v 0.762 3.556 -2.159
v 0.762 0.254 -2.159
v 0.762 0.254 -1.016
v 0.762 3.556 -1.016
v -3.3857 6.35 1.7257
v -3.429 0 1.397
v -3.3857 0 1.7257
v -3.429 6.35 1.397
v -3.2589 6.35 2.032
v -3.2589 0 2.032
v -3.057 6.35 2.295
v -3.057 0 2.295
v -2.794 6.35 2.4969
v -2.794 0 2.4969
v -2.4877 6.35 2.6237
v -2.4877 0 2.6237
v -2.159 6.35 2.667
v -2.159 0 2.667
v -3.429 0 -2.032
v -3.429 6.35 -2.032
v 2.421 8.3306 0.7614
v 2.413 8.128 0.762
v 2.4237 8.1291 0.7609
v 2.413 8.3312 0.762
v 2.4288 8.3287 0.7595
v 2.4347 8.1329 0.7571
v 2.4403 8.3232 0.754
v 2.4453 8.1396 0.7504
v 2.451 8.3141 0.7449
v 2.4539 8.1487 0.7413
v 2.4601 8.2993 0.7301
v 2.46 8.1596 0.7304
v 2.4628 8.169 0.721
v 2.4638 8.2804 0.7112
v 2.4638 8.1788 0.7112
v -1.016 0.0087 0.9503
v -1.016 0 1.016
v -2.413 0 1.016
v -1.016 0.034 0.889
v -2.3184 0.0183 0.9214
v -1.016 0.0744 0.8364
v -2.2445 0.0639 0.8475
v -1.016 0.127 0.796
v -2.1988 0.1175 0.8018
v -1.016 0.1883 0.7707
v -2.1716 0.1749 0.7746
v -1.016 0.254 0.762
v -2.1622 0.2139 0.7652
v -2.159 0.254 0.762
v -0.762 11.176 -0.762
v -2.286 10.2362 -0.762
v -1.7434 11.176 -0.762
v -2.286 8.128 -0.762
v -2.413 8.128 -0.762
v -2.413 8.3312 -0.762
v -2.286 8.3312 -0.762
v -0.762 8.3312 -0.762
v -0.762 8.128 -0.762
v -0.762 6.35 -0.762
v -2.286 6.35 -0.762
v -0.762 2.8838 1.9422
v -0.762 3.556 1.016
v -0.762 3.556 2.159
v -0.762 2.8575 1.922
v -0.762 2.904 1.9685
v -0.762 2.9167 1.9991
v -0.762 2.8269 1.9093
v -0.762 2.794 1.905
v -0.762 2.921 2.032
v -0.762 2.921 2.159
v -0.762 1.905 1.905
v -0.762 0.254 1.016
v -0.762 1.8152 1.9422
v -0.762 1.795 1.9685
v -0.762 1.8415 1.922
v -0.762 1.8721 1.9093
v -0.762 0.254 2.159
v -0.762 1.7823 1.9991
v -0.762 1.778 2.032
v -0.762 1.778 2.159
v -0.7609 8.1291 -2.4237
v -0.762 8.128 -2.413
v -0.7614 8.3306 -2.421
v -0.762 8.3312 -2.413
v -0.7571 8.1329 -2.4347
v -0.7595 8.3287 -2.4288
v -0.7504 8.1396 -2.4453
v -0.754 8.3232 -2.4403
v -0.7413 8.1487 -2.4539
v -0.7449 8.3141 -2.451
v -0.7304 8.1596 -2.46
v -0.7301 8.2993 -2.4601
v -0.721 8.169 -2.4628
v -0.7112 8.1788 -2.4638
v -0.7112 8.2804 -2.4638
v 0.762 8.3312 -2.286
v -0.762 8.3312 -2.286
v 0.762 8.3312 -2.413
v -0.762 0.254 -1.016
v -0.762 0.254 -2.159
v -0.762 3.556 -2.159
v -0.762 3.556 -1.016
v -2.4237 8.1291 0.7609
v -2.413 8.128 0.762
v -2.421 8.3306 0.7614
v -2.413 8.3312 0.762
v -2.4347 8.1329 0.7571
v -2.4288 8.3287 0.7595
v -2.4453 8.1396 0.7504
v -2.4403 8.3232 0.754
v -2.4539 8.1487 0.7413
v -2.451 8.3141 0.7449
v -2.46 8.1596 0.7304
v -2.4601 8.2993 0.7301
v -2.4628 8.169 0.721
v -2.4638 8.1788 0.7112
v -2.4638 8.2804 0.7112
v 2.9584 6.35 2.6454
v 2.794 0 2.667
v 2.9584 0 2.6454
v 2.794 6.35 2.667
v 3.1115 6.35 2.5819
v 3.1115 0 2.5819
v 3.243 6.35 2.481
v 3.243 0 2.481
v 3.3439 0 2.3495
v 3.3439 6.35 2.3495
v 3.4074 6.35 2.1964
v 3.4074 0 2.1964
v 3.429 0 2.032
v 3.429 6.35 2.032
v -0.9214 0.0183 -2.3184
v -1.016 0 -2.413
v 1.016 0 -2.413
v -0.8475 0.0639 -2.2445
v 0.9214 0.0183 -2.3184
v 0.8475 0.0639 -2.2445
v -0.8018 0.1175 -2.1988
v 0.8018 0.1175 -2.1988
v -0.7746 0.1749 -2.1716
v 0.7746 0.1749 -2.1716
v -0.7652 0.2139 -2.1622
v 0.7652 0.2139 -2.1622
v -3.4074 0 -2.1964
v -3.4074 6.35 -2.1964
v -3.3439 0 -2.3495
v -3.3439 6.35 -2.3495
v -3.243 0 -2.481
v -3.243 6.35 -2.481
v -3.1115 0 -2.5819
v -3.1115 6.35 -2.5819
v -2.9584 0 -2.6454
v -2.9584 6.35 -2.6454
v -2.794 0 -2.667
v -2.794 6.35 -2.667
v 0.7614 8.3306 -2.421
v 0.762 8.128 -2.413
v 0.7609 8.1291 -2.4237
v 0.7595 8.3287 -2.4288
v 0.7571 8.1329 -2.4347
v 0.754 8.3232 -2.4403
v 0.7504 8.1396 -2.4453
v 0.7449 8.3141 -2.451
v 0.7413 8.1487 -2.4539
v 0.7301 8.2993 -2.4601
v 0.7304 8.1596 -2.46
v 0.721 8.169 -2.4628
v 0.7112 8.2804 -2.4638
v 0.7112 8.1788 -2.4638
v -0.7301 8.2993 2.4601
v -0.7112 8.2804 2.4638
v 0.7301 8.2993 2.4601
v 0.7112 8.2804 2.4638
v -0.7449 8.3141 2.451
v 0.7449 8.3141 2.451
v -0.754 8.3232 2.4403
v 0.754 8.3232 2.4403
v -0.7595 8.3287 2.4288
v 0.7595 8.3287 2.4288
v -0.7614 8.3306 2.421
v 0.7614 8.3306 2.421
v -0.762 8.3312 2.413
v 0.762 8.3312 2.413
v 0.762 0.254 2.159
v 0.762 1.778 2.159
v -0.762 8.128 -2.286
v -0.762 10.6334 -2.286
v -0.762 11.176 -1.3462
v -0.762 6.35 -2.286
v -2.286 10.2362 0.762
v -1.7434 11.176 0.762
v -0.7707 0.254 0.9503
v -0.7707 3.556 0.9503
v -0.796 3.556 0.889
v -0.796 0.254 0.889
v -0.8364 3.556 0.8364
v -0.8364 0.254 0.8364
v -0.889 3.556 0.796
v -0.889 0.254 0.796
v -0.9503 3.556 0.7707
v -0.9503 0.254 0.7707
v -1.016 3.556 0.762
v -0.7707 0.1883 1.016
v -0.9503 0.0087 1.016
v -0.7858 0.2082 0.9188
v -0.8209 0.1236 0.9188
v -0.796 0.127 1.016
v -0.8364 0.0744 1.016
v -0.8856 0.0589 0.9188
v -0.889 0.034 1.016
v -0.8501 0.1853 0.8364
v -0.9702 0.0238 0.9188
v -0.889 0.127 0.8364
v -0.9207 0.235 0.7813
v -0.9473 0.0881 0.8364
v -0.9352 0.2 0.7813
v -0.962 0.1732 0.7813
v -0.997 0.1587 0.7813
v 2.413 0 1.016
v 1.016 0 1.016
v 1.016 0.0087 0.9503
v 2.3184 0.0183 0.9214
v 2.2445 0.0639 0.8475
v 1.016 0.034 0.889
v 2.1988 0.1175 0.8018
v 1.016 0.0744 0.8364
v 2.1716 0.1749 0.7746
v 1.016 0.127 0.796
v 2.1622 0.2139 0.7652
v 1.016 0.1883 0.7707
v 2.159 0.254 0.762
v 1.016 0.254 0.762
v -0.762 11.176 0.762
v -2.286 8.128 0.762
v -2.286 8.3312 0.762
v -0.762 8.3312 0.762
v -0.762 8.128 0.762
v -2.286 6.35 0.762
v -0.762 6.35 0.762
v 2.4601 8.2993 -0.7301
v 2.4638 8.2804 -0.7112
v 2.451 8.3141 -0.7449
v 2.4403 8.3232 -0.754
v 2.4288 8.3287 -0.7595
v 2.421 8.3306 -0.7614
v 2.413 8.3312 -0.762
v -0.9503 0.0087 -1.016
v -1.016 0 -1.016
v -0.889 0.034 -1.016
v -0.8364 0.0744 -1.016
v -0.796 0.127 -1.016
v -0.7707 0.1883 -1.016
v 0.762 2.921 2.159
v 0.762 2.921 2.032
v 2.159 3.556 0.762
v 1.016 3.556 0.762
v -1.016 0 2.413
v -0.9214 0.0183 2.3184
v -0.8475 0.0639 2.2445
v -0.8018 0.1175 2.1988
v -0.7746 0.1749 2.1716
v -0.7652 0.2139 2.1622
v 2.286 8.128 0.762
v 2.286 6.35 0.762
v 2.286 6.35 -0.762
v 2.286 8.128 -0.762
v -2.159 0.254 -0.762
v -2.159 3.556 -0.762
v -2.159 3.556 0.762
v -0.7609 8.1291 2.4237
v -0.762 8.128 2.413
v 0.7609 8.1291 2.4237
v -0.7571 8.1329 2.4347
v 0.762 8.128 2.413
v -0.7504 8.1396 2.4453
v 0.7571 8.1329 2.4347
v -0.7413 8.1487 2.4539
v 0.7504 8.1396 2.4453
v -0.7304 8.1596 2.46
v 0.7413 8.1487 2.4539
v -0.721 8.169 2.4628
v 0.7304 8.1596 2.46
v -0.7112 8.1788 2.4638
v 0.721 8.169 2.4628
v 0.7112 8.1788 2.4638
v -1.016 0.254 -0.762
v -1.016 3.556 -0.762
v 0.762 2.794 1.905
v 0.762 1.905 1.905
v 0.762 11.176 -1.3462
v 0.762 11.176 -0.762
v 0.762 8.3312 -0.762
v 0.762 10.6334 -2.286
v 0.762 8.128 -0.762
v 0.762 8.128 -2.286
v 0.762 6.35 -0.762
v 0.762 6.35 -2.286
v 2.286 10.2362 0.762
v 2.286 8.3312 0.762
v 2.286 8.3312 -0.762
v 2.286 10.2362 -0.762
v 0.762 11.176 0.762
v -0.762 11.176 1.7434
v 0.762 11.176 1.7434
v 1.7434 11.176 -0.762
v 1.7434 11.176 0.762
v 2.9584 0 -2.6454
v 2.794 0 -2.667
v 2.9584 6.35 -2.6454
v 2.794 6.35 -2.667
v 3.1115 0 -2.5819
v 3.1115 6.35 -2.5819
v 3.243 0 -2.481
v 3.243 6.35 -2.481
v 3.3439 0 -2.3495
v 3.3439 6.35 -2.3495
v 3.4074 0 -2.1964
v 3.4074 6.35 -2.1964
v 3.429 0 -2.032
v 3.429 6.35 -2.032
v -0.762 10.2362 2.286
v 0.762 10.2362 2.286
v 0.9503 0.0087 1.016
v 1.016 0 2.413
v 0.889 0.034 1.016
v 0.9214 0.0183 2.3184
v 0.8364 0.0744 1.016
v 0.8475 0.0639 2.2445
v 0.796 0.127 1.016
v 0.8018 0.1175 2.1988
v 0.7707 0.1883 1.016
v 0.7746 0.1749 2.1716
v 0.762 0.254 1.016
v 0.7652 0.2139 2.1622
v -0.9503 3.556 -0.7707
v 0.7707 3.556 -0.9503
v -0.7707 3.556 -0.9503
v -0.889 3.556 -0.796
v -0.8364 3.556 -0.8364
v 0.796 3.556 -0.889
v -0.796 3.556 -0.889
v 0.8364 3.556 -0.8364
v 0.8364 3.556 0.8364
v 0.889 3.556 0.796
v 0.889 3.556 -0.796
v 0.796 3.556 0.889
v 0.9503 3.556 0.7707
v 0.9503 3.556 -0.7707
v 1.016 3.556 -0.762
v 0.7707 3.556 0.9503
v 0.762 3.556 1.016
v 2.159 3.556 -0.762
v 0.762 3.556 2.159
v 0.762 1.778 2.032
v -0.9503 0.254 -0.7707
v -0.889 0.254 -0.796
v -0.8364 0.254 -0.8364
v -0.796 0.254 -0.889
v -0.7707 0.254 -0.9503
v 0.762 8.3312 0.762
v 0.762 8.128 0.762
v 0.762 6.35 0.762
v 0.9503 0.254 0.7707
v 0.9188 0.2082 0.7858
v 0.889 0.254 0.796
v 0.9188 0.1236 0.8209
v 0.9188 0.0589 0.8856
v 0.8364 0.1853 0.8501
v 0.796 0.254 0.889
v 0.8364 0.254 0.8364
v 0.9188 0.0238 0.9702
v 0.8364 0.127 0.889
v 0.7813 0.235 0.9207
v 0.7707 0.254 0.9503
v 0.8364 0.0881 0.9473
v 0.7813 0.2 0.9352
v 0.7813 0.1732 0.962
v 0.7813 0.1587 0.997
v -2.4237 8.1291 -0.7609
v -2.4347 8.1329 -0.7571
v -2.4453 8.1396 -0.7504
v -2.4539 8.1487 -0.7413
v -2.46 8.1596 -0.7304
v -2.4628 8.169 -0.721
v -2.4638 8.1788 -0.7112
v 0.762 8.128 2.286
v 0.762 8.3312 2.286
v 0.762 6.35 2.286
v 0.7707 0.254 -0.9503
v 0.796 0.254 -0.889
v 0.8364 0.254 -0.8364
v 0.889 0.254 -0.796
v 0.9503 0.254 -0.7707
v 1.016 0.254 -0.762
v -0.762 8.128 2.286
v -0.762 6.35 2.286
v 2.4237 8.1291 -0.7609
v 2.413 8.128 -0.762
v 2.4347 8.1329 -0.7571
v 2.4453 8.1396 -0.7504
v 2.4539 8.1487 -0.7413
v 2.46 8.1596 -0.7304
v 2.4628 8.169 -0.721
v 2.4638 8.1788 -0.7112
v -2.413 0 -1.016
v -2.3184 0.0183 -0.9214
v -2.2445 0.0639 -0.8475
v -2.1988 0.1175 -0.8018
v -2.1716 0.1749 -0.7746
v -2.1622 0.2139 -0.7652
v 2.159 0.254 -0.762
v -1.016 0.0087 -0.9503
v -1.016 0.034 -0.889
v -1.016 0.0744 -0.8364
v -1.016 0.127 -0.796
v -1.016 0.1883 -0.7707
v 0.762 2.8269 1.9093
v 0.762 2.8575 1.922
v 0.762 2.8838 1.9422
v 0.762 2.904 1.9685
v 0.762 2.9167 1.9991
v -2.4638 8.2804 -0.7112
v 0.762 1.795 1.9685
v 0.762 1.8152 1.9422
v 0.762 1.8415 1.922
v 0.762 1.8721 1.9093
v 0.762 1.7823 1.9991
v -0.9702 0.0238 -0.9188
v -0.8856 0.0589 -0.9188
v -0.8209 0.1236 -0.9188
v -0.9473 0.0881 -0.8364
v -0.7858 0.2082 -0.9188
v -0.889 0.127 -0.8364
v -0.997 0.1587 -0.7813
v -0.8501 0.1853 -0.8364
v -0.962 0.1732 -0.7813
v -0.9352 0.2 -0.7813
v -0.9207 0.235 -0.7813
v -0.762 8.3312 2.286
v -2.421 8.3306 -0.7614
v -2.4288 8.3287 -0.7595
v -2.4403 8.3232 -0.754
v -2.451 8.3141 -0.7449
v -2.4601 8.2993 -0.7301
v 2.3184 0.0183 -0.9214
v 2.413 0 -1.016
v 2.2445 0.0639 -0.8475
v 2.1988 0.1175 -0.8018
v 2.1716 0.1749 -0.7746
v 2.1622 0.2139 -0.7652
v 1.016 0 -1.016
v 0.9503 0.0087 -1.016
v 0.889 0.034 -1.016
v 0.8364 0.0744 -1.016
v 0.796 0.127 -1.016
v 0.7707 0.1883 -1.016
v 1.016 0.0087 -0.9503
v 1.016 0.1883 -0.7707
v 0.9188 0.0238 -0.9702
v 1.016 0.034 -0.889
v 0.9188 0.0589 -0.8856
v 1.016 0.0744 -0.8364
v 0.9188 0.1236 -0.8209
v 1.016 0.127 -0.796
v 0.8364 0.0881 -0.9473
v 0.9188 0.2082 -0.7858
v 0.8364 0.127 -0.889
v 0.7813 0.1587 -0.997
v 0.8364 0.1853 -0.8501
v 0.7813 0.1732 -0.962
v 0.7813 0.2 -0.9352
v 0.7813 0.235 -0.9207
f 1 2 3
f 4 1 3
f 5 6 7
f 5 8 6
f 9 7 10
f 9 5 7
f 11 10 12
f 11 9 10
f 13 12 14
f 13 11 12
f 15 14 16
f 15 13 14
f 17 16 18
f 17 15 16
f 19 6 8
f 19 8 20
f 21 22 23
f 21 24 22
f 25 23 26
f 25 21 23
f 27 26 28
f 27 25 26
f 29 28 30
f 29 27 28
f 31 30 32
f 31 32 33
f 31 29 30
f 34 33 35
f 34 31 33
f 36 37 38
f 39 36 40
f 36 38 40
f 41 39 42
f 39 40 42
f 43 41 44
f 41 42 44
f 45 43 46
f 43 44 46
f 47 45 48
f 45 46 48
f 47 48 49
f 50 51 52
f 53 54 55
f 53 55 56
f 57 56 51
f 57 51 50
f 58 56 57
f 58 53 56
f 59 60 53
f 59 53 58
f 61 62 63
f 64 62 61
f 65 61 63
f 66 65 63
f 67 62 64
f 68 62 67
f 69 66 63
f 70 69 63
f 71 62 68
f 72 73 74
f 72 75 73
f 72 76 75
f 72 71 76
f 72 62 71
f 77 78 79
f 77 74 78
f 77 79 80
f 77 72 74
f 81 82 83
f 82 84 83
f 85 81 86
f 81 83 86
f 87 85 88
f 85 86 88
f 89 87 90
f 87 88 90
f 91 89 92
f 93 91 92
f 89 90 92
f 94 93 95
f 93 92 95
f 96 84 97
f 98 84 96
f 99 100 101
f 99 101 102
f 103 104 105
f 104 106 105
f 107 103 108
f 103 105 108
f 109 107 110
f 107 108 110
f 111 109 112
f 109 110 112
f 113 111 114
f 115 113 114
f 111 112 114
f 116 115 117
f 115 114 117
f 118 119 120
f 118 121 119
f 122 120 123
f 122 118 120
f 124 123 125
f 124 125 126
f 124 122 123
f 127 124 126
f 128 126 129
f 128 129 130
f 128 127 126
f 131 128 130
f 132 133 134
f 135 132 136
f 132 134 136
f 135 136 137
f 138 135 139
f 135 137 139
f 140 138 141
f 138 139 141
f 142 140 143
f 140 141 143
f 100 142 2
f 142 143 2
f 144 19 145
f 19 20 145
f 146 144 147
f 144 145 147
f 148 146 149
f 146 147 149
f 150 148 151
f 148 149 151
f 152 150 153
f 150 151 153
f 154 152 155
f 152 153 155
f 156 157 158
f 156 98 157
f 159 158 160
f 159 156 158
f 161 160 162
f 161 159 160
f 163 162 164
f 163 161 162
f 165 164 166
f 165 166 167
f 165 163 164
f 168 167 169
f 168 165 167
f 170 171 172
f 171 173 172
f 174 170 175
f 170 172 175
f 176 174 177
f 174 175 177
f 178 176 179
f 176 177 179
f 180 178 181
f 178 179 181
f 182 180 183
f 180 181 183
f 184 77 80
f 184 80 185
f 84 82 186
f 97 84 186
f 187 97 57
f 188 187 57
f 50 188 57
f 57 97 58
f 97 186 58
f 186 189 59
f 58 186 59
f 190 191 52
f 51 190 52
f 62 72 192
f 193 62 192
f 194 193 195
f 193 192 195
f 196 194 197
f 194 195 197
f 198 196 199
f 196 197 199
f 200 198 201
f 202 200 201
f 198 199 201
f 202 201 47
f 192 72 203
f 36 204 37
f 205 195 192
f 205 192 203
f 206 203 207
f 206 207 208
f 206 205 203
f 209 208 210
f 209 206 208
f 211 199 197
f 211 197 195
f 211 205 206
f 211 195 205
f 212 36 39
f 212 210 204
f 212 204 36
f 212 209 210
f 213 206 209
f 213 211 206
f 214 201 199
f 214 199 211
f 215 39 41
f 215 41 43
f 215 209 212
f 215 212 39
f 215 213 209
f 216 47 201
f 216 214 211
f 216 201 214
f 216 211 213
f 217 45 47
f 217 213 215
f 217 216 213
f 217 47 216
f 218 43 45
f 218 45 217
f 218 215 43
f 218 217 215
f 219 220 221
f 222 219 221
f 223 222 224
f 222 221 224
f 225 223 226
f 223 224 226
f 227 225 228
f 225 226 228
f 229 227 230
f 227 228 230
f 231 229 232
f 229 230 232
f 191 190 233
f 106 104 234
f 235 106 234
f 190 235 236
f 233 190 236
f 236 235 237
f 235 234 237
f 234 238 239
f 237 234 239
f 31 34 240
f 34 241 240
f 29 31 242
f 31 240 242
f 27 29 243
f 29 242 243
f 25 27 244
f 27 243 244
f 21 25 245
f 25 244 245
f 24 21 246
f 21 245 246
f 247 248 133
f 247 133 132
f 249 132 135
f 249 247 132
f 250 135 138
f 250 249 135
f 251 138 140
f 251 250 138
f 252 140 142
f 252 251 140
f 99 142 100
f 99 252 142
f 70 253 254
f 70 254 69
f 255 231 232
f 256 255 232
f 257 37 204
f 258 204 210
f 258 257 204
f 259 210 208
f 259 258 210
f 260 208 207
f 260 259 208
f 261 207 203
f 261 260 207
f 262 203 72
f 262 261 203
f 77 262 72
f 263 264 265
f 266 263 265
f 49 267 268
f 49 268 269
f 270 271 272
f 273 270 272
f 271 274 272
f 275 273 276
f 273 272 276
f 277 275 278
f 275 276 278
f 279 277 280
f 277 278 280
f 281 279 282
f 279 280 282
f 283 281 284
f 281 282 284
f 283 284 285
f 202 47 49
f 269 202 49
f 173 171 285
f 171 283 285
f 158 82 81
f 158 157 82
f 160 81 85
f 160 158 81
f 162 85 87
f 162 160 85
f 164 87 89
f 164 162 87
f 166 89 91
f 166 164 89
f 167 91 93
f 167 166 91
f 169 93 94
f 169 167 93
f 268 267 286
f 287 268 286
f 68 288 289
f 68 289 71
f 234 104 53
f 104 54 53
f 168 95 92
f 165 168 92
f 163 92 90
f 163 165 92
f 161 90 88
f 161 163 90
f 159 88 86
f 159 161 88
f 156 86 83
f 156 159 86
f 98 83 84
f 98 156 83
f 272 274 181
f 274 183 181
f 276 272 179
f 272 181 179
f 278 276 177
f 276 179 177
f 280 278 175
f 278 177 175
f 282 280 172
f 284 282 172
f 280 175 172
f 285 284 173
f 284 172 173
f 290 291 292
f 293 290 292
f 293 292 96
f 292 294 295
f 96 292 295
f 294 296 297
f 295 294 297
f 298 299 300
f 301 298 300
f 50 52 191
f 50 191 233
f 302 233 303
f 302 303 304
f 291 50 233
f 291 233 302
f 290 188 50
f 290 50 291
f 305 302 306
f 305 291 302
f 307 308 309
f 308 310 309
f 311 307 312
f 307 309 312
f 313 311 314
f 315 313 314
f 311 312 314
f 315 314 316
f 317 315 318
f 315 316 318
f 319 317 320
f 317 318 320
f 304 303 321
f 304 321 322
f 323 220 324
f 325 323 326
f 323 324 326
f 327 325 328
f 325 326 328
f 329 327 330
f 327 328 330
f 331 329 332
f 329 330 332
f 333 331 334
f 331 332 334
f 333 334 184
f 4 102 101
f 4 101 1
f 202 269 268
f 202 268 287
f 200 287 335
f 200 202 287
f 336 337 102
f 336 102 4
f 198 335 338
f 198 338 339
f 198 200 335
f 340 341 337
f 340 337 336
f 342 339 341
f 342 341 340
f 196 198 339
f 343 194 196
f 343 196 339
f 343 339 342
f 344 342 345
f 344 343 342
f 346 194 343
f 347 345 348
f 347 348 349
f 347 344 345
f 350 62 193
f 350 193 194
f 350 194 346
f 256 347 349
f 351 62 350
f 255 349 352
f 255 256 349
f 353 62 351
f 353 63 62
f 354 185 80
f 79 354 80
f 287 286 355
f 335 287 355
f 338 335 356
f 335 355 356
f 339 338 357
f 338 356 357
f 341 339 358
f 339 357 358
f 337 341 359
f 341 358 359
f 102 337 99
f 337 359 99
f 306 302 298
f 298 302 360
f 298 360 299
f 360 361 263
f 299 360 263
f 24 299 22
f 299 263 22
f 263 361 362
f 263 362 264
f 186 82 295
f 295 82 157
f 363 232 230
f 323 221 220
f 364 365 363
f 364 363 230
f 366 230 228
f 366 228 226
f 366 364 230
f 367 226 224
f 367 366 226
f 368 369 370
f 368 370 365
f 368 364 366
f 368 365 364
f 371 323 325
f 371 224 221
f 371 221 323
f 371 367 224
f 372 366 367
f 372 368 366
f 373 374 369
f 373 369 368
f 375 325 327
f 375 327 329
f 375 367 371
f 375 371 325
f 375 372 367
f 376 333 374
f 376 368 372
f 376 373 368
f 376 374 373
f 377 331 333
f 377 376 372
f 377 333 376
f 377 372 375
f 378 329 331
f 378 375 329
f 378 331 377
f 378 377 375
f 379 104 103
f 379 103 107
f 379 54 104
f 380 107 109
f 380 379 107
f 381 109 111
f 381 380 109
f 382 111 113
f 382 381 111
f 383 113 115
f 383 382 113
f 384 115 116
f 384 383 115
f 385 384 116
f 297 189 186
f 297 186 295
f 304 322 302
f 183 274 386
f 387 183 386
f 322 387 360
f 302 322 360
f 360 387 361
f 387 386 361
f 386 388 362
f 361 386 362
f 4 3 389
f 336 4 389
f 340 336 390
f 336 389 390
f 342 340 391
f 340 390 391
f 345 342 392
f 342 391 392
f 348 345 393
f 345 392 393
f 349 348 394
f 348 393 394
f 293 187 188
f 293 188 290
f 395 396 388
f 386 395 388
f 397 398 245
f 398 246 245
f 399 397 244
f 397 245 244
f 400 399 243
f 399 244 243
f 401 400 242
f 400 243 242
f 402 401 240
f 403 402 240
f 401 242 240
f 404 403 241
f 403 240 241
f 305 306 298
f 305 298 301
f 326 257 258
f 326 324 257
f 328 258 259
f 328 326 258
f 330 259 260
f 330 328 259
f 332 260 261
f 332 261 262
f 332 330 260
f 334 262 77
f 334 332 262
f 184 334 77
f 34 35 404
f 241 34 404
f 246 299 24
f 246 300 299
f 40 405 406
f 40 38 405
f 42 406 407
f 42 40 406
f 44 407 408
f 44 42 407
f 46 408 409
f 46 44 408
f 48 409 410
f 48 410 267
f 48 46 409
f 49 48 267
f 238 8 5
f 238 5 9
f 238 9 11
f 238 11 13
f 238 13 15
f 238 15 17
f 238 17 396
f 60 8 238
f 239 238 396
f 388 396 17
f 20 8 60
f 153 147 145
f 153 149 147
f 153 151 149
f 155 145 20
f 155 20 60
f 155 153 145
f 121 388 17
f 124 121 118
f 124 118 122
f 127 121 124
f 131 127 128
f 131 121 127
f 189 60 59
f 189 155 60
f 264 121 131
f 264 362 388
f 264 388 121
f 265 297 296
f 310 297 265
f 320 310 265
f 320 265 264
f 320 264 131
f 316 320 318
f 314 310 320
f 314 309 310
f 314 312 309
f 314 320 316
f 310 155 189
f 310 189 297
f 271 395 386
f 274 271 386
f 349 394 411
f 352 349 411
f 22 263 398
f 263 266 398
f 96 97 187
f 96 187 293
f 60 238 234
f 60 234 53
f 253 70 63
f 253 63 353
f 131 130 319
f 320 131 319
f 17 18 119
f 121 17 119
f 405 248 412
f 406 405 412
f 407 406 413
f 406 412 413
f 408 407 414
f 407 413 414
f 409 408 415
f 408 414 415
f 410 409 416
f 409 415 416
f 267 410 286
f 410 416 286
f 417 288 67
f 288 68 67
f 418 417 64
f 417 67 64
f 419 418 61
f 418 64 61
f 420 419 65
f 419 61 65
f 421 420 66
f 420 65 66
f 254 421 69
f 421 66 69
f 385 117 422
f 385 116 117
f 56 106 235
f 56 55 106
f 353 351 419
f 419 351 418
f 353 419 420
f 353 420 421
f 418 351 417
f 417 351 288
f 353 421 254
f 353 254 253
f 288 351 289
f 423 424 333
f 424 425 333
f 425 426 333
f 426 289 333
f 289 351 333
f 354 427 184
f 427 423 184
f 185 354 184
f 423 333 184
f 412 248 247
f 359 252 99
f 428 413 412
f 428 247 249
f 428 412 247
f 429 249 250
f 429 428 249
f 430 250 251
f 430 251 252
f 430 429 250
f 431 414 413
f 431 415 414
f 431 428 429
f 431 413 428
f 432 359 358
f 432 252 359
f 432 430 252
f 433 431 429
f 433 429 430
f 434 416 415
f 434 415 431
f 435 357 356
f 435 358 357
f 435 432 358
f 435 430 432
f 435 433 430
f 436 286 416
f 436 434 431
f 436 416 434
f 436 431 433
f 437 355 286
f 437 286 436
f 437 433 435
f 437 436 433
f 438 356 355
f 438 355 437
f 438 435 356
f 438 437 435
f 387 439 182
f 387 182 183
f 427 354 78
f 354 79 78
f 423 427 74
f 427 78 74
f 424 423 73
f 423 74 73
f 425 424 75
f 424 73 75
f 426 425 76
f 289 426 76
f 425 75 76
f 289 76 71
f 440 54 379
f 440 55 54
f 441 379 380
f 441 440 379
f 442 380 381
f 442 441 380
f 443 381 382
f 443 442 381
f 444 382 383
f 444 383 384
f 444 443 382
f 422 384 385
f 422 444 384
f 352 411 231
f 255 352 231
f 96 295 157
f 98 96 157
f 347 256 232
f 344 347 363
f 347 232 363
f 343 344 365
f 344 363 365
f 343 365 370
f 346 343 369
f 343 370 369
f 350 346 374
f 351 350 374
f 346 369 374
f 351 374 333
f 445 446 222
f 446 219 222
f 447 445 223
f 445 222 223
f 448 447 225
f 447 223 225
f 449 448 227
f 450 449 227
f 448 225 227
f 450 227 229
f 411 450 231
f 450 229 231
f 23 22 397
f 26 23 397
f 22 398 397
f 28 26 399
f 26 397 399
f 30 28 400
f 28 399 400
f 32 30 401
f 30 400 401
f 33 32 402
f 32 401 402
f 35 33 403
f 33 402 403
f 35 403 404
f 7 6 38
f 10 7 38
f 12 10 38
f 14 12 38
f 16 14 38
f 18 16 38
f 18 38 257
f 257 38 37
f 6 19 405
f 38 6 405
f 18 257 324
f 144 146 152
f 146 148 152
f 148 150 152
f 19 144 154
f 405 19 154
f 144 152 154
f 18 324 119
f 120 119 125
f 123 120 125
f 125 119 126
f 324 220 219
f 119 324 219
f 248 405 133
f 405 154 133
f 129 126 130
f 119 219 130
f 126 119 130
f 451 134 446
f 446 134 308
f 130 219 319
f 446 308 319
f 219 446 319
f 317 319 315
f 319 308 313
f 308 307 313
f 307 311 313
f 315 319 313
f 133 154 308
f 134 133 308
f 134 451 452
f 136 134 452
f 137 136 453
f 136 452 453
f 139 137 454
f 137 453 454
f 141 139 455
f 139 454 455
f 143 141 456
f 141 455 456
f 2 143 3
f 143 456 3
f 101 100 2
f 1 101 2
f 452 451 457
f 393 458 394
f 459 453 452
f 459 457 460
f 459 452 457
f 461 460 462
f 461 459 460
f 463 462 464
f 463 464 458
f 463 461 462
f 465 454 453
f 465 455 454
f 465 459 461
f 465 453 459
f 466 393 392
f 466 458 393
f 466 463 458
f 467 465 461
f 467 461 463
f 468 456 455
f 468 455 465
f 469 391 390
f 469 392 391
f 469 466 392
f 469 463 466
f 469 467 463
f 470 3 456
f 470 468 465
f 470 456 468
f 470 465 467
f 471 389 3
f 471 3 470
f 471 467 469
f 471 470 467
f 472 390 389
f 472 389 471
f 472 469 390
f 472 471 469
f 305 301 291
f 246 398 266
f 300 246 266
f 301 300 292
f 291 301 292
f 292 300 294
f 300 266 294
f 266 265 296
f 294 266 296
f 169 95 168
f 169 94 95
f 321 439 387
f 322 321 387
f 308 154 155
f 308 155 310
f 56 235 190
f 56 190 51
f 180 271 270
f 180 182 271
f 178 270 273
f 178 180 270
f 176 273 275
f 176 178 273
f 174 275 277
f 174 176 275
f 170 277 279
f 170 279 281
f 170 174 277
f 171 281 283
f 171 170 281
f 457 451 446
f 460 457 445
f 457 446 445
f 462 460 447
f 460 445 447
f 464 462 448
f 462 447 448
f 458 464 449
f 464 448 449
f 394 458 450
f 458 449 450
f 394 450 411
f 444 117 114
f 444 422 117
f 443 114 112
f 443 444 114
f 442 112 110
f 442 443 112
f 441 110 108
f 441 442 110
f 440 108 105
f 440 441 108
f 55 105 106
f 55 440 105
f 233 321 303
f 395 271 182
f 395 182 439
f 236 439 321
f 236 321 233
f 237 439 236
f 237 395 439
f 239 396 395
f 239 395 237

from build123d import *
from OCP.BRepFilletAPI import BRepFilletAPI_MakeChamfer

# Parameters (mm, degrees)
SKETCH1_W           = 6.858
SKETCH1_H           = 5.334
BOSS_EXTRUDE1_DEPTH = 6.35
SKETCH2_W           = 1.524
SKETCH2_H           = 1.524
BOSS_EXTRUDE2_DEPTH = 4.826
CHAMFER1_SIZE       = 0.9398
CHAMFER1_SIZE2      = 0.542593783
BOSS_EXTRUDE3_START = -3.048
SKETCH3_W           = 0.720393783
SKETCH3_H           = 1.524
SKETCH3_W_2         = 0.981406217
SKETCH3_W_3         = 1.524
SKETCH3_H_2         = 1.1176
SKETCH3_H_3         = 0.5842
SKETCH3_H_4         = 0.981406217
SKETCH3_H_5         = 0.720393783
BOSS_EXTRUDE3_DEPTH = 0.2032
SKETCH4_W           = 1.397
SKETCH4_H           = 1.524
SKETCH4_W_2         = 1.524
SKETCH4_H_2         = 1.397
CUT_EXTRUDE1_DEPTH  = 3.556
SKETCH5_W           = 1.524
SKETCH5_H           = 1.143
BOSS_EXTRUDE4_DEPTH = 0.254
FILLET1_R           = 0.127
FILLET2_R           = 0.0508
FILLET3_R           = 0.635
FILLET4_R           = 0.254
FILLET5_R           = 0.254
FILLET6_R           = 1.27


with BuildPart() as part:
    # Sketch1 → Boss-Extrude1 (new body)
    with BuildSketch(Plane(origin=(0, 0, 0), x_dir=(1, 0, 0), z_dir=(0, 1, 0))):
        Rectangle(SKETCH1_W, SKETCH1_H)
    extrude(amount=BOSS_EXTRUDE1_DEPTH)

    # Sketch2 → Boss-Extrude2 (add)
    with BuildSketch(Plane(origin=(0, 6.35, 0), x_dir=(1, 0, 0), z_dir=(0, 1, 0))):
        Rectangle(SKETCH2_W, SKETCH2_H)
        with Locations((1.524, 0)):
            Rectangle(SKETCH2_W, SKETCH2_H)
        with Locations((0, 1.524)):
            Rectangle(SKETCH2_W, SKETCH2_H)
        with Locations((-1.524, 0)):
            Rectangle(SKETCH2_W, SKETCH2_H)
        with Locations((0, -1.524)):
            Rectangle(SKETCH2_W, SKETCH2_H)
    extrude(amount=BOSS_EXTRUDE2_DEPTH)

    # Chamfer1: one chamfer whose edges measure the first distance from different faces: ONE call of the kernel's chamfer builder (chamfer() names one face for all edges)
    chamfer1_edges_1 = [part.edges().sort_by_distance(p)[0] for p in [
        (2.286, 11.176, 0),
    ]]
    chamfer1_side_1 = [part.faces().sort_by_distance(p)[0] for p in [
        (2.286, 8.763, 0),
    ]]
    chamfer1_edges_2 = [part.edges().sort_by_distance(p)[0] for p in [
        (0, 11.176, -2.286),
    ]]
    chamfer1_side_2 = [part.faces().sort_by_distance(p)[0] for p in [
        (0, 11.176, 0),
    ]]
    chamfer1_edges_3 = [part.edges().sort_by_distance(p)[0] for p in [
        (-2.286, 11.176, 0),
    ]]
    chamfer1_side_3 = [part.faces().sort_by_distance(p)[0] for p in [
        (-2.286, 8.763, 0),
    ]]
    chamfer1_edges_4 = [part.edges().sort_by_distance(p)[0] for p in [
        (0, 11.176, 2.286),
    ]]
    chamfer1_side_4 = [part.faces().sort_by_distance(p)[0] for p in [
        (0, 8.763, 2.286),
    ]]
    chamfer1 = BRepFilletAPI_MakeChamfer(part.part.solid().wrapped)
    for e in chamfer1_edges_1:
        chamfer1.Add(CHAMFER1_SIZE, CHAMFER1_SIZE2, e.wrapped, chamfer1_side_1[0].wrapped)  # the first distance lies on this face
    for e in chamfer1_edges_2:
        chamfer1.Add(CHAMFER1_SIZE, CHAMFER1_SIZE2, e.wrapped, chamfer1_side_2[0].wrapped)  # the first distance lies on this face
    for e in chamfer1_edges_3:
        chamfer1.Add(CHAMFER1_SIZE, CHAMFER1_SIZE2, e.wrapped, chamfer1_side_3[0].wrapped)  # the first distance lies on this face
    for e in chamfer1_edges_4:
        chamfer1.Add(CHAMFER1_SIZE, CHAMFER1_SIZE2, e.wrapped, chamfer1_side_4[0].wrapped)  # the first distance lies on this face
    add(Compound.cast(chamfer1.Shape()), mode=Mode.REPLACE)

    # Sketch3 → Boss-Extrude3 (add)
    with BuildSketch(Plane(origin=(0, 11.176, 0), x_dir=(1, 0, 0), z_dir=(0, 1, 0)).offset(BOSS_EXTRUDE3_START)):
        with Locations((2.103603109, 0)):
            Rectangle(SKETCH3_W, SKETCH3_H)
        with Locations((1.252703108, 0)):
            Rectangle(SKETCH3_W_2, SKETCH3_H)
        with Locations((0, 1.905)):
            Rectangle(SKETCH3_W_3, SKETCH3_H_2)
        with Locations((0, 1.0541)):
            Rectangle(SKETCH3_W_3, SKETCH3_H_3)
        Rectangle(SKETCH3_W_3, SKETCH3_H)
        with Locations((-1.252703108, 0)):
            Rectangle(SKETCH3_W_2, SKETCH3_H)
        with Locations((-2.103603109, 0)):
            Rectangle(SKETCH3_W, SKETCH3_H)
        with Locations((0, -1.252703108)):
            Rectangle(SKETCH3_W_3, SKETCH3_H_4)
        with Locations((0, -2.103603109)):
            Rectangle(SKETCH3_W_3, SKETCH3_H_5)
    extrude(amount=BOSS_EXTRUDE3_DEPTH)

    # Sketch4 → Cut-Extrude1 (cut)
    with BuildSketch(Plane.XZ):
        with Locations((-1.4605, 0)):
            Rectangle(SKETCH4_W, SKETCH4_H)
        Rectangle(SKETCH4_W_2, SKETCH4_H)
        with Locations((1.4605, 0)):
            Rectangle(SKETCH4_W, SKETCH4_H)
        with Locations((0, -1.4605)):
            Rectangle(SKETCH4_W_2, SKETCH4_H_2)
        with Locations((0, 1.4605)):
            Rectangle(SKETCH4_W_2, SKETCH4_H_2)
    extrude(amount=-CUT_EXTRUDE1_DEPTH, mode=Mode.SUBTRACT)

    # Sketch5 → Boss-Extrude4 (add)
    with BuildSketch(Plane(origin=(0, 0, 2.159), x_dir=(-1, 0, 0), z_dir=(0, 0, -1))):
        with Locations((0, 2.3495)):
            Rectangle(SKETCH5_W, SKETCH5_H)
    extrude(amount=BOSS_EXTRUDE4_DEPTH)

    # Fillet1
    fillet1_edges = [part.edges().sort_by_distance(p)[0] for p in [
        (0, 1.778, 1.905),
        (0, 2.921, 1.905),
    ]]
    fillet(fillet1_edges, radius=FILLET1_R)

    # Fillet2
    fillet2_edges = [part.edges().sort_by_distance(p)[0] for p in [
        (-2.4638, 8.3312, 0),
        (0, 8.3312, 2.4638),
        (2.4638, 8.128, 0),
        (2.4638, 8.3312, 0),
        (2.4638, 8.2296, 0.762),
        (2.4638, 8.2296, -0.762),
        (0, 8.3312, -2.4638),
        (0.762, 8.2296, -2.4638),
        (-0.762, 8.2296, -2.4638),
        (-2.4638, 8.128, 0),
        (-2.4638, 8.2296, -0.762),
        (0, 8.128, 2.4638),
        (-0.762, 8.2296, 2.4638),
        (0, 8.128, -2.4638),
        (-2.4638, 8.2296, 0.762),
        (0.762, 8.2296, 2.4638),
    ]]
    fillet(fillet2_edges, radius=FILLET2_R)

    # Fillet3
    fillet3_edges = [part.edges().sort_by_distance(p)[0] for p in [
        (3.429, 3.175, 2.667),
        (-3.429, 3.175, -2.667),
        (3.429, 3.175, -2.667),
    ]]
    fillet(fillet3_edges, radius=FILLET3_R)

    # Fillet4
    fillet4_edges = [part.edges().sort_by_distance(p)[0] for p in [
        (-1.4605, 0, -0.762),
        (-2.159, 0, 0),
        (0.762, 0, 1.4605),
        (1.4605, 0, -0.762),
        (0.762, 0, -1.4605),
        (0, 0, -2.159),
        (-0.762, 0, -1.4605),
        (2.159, 0, 0),
        (1.4605, 0, 0.762),
        (0, 0, 2.159),
        (-0.762, 0, 1.4605),
        (-1.4605, 0, 0.762),
    ]]
    fillet(fillet4_edges, radius=FILLET4_R)

    # Fillet5
    # the kernel refuses this fillet: 0.254 mm, written as the material it takes off along each edge
    with BuildSketch(Plane(origin=(1.016, 0.254, -1.016), x_dir=(0, 0, 1), z_dir=(-1, 0, 0))) as fillet5_piece_1_section:
        Polygon((0, 0), (FILLET5_R, 0), (FILLET5_R, -FILLET5_R), (0, -FILLET5_R), align=None)
    fillet5_piece_1 = extrude(amount=FILLET5_R, mode=Mode.PRIVATE)
    fillet5_piece_1 = fillet5_piece_1 - Plane(origin=(1.016, 0.254, -1.016), x_dir=(0, 0.7071067811865475, -0.7071067811865475), z_dir=(-1, 0, 0)) * Sphere(FILLET5_R, mode=Mode.PRIVATE)
    add(fillet5_piece_1, mode=Mode.SUBTRACT)
    with BuildSketch(Plane(origin=(1.016, 0.254, 1.016), x_dir=(0, 0, -1), z_dir=(-1, 0, 0))) as fillet5_piece_2_section:
        Polygon((0, 0), (FILLET5_R, 0), (FILLET5_R, FILLET5_R), (0, FILLET5_R), align=None)
    fillet5_piece_2 = extrude(amount=FILLET5_R, mode=Mode.PRIVATE)
    fillet5_piece_2 = fillet5_piece_2 - Plane(origin=(1.016, 0.254, 1.016), x_dir=(0, 0.7071067811865475, 0.7071067811865475), z_dir=(-1, 0, 0)) * Sphere(FILLET5_R, mode=Mode.PRIVATE)
    add(fillet5_piece_2, mode=Mode.SUBTRACT)
    with BuildSketch(Plane(origin=(-1.016, 0.254, -1.016), x_dir=(1, 0, 0), z_dir=(0, 0, 1))) as fillet5_piece_3_section:
        Polygon((0, 0), (FILLET5_R, 0), (FILLET5_R, -FILLET5_R), (0, -FILLET5_R), align=None)
    fillet5_piece_3 = extrude(amount=FILLET5_R, mode=Mode.PRIVATE)
    fillet5_piece_3 = fillet5_piece_3 - Plane(origin=(-1.016, 0.254, -1.016), x_dir=(-0.7071067811865475, 0.7071067811865475, 0), z_dir=(0, 0, 1)) * Sphere(FILLET5_R, mode=Mode.PRIVATE)
    add(fillet5_piece_3, mode=Mode.SUBTRACT)
    with BuildSketch(Plane(origin=(-1.016, 0.254, 1.016), x_dir=(1, 0, 0), z_dir=(0, 0, -1))) as fillet5_piece_4_section:
        Polygon((0, 0), (FILLET5_R, 0), (FILLET5_R, FILLET5_R), (0, FILLET5_R), align=None)
    fillet5_piece_4 = extrude(amount=FILLET5_R, mode=Mode.PRIVATE)
    fillet5_piece_4 = fillet5_piece_4 - Plane(origin=(-1.016, 0.254, 1.016), x_dir=(-0.7071067811865475, 0.7071067811865475, 0), z_dir=(0, 0, -1)) * Sphere(FILLET5_R, mode=Mode.PRIVATE)
    add(fillet5_piece_4, mode=Mode.SUBTRACT)
    with BuildSketch(Plane(origin=(-0.762, 0.254, -0.762), x_dir=(-1, 0, 0), z_dir=(0, 1, 0)), Plane(origin=(0.762, 0.254, -0.762), x_dir=(0, 0, -1), z_dir=(0, 1, 0))) as fillet5_piece_5:
        with BuildLine():
            CenterArc((FILLET5_R, -FILLET5_R), FILLET5_R, 90, 90)
            Line((0, -FILLET5_R), (0, 0))
            Line((0, 0), (FILLET5_R, 0))
        make_face()
    extrude(amount=3.302, mode=Mode.SUBTRACT)
    with BuildSketch(Plane(origin=(-0.762, 0.254, 0.762), x_dir=(-1, 0, 0), z_dir=(0, 1, 0)), Plane(origin=(0.762, 0.254, 0.762), x_dir=(0, 0, 1), z_dir=(0, 1, 0))) as fillet5_piece_6:
        with BuildLine():
            CenterArc((FILLET5_R, FILLET5_R), FILLET5_R, 180, 90)
            Line((0, FILLET5_R), (0, 0))
            Line((0, 0), (FILLET5_R, 0))
        make_face()
    extrude(amount=3.302, mode=Mode.SUBTRACT)

    # Fillet6
    fillet6_edges = [part.edges().sort_by_distance(p)[0] for p in [
        (-3.429, 3.175, 2.667),
    ]]
    fillet(fillet6_edges, radius=FILLET6_R)


solid = part.part
